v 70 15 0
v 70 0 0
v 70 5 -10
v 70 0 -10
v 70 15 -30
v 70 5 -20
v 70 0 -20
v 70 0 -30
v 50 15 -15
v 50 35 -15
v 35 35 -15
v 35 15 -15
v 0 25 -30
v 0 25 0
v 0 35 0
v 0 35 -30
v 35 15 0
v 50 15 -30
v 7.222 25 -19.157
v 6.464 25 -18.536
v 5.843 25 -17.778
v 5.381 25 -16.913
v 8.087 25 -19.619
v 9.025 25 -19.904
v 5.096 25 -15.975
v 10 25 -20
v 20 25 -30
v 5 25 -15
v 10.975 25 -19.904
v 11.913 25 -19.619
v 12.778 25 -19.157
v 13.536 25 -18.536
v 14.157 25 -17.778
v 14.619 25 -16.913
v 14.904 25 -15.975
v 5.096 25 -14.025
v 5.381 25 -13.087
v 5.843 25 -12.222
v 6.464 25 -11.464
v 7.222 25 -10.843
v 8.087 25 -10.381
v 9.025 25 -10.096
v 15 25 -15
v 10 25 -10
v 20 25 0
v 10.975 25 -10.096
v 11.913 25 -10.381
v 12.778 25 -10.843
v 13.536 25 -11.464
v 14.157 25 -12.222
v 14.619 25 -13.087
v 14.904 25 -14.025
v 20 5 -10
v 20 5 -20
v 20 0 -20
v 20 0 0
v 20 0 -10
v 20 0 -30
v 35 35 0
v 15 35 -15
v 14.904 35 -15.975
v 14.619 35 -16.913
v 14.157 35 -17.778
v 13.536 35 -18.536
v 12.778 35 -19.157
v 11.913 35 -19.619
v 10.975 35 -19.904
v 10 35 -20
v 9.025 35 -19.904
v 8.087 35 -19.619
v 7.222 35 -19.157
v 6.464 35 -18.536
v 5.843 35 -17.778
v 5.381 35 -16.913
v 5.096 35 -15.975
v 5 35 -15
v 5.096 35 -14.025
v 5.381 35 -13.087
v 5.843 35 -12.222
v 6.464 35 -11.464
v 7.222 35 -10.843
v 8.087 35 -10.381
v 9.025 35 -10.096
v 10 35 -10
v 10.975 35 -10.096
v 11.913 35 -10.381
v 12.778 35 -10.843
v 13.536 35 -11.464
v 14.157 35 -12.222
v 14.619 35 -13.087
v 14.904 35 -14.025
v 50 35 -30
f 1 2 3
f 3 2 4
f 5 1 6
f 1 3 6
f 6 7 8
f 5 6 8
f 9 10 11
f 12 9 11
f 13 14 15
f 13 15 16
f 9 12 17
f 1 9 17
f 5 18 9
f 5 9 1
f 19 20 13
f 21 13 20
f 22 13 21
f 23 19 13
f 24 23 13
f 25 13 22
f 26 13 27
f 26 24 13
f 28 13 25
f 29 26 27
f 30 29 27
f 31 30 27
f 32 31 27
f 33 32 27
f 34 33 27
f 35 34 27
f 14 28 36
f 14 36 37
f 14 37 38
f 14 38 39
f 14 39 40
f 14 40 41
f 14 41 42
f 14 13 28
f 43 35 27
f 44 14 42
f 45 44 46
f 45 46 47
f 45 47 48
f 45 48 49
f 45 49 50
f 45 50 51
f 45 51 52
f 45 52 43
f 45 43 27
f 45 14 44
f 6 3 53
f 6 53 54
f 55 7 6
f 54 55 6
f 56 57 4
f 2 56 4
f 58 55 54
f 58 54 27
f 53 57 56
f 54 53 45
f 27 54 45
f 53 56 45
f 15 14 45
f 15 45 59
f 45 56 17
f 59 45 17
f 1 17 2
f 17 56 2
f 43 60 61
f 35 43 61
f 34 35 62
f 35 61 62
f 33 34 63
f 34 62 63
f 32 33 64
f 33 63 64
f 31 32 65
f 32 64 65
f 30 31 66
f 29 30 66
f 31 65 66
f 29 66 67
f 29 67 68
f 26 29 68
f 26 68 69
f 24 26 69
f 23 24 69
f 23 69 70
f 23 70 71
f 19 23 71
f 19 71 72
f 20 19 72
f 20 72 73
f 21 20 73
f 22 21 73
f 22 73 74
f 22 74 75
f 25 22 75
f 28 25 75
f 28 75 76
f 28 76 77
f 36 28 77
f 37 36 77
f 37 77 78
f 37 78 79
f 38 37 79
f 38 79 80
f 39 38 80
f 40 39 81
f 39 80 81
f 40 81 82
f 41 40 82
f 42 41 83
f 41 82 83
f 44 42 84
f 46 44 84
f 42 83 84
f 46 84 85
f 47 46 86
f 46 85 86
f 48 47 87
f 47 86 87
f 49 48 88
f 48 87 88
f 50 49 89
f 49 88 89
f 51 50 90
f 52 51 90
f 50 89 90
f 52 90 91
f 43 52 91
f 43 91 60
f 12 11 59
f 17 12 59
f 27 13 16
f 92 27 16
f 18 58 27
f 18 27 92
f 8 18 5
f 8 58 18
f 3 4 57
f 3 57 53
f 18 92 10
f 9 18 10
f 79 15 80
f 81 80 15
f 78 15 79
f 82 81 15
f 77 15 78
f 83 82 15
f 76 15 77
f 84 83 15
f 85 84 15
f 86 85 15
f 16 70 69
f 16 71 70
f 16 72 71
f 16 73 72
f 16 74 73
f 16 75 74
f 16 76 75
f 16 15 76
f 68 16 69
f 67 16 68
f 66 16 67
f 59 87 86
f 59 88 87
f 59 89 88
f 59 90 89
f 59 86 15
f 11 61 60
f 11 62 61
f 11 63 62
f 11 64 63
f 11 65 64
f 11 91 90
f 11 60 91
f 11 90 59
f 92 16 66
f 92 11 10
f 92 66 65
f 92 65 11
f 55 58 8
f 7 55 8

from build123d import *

# Parameters (mm, degrees)
SKETCH1_W           = 70
SKETCH1_H           = 30
BOSS_EXTRUDE1_DEPTH = 35
CUT_EXTRUDE1_DEPTH  = 20
SKETCH3_W           = 20
SKETCH3_H           = 25
CUT_EXTRUDE2_DEPTH  = 31
SKETCH4_R           = 5
CUT_EXTRUDE3_DEPTH  = 36
SKETCH5_W           = 10
SKETCH5_H           = 5
CUT_EXTRUDE4_DEPTH  = 71


with BuildPart() as part:
    # Sketch1 → Boss-Extrude1 (new body)
    with BuildSketch(Plane(origin=(0, 0, 0), x_dir=(1, 0, 0), z_dir=(0, 1, 0))):
        with Locations((35, 15)):
            Rectangle(SKETCH1_W, SKETCH1_H)
    extrude(amount=BOSS_EXTRUDE1_DEPTH)

    # Sketch2 → Cut-Extrude1 (cut)
    with BuildSketch(Plane(origin=(0, 35, 0), x_dir=(1, 0, 0), z_dir=(0, 1, 0))):
        Polygon((70, 30), (50, 30), (50, 15), (35, 15), (35, 0), (70, 0), align=None)
    extrude(amount=-CUT_EXTRUDE1_DEPTH, mode=Mode.SUBTRACT)

    # Sketch3 → Cut-Extrude2 (cut, through all)
    with BuildSketch(Plane.XY):
        with Locations((10, 12.5)):
            Rectangle(SKETCH3_W, SKETCH3_H)
    extrude(amount=-CUT_EXTRUDE2_DEPTH, mode=Mode.SUBTRACT)

    # Sketch4 → Cut-Extrude3 (cut, through all)
    with BuildSketch(Plane(origin=(0, 35, 0), x_dir=(1, 0, 0), z_dir=(0, 1, 0))):
        with Locations((10, 15)):
            Circle(SKETCH4_R)
    extrude(amount=-CUT_EXTRUDE3_DEPTH, mode=Mode.SUBTRACT)

    # Sketch5 → Cut-Extrude4 (cut, through all)
    with BuildSketch(Plane(origin=(70, 0, 0), x_dir=(0, 0, -1), z_dir=(1, 0, 0))):
        with Locations((15, 2.5)):
            Rectangle(SKETCH5_W, SKETCH5_H)
    extrude(amount=-CUT_EXTRUDE4_DEPTH, mode=Mode.SUBTRACT)


solid = part.part
